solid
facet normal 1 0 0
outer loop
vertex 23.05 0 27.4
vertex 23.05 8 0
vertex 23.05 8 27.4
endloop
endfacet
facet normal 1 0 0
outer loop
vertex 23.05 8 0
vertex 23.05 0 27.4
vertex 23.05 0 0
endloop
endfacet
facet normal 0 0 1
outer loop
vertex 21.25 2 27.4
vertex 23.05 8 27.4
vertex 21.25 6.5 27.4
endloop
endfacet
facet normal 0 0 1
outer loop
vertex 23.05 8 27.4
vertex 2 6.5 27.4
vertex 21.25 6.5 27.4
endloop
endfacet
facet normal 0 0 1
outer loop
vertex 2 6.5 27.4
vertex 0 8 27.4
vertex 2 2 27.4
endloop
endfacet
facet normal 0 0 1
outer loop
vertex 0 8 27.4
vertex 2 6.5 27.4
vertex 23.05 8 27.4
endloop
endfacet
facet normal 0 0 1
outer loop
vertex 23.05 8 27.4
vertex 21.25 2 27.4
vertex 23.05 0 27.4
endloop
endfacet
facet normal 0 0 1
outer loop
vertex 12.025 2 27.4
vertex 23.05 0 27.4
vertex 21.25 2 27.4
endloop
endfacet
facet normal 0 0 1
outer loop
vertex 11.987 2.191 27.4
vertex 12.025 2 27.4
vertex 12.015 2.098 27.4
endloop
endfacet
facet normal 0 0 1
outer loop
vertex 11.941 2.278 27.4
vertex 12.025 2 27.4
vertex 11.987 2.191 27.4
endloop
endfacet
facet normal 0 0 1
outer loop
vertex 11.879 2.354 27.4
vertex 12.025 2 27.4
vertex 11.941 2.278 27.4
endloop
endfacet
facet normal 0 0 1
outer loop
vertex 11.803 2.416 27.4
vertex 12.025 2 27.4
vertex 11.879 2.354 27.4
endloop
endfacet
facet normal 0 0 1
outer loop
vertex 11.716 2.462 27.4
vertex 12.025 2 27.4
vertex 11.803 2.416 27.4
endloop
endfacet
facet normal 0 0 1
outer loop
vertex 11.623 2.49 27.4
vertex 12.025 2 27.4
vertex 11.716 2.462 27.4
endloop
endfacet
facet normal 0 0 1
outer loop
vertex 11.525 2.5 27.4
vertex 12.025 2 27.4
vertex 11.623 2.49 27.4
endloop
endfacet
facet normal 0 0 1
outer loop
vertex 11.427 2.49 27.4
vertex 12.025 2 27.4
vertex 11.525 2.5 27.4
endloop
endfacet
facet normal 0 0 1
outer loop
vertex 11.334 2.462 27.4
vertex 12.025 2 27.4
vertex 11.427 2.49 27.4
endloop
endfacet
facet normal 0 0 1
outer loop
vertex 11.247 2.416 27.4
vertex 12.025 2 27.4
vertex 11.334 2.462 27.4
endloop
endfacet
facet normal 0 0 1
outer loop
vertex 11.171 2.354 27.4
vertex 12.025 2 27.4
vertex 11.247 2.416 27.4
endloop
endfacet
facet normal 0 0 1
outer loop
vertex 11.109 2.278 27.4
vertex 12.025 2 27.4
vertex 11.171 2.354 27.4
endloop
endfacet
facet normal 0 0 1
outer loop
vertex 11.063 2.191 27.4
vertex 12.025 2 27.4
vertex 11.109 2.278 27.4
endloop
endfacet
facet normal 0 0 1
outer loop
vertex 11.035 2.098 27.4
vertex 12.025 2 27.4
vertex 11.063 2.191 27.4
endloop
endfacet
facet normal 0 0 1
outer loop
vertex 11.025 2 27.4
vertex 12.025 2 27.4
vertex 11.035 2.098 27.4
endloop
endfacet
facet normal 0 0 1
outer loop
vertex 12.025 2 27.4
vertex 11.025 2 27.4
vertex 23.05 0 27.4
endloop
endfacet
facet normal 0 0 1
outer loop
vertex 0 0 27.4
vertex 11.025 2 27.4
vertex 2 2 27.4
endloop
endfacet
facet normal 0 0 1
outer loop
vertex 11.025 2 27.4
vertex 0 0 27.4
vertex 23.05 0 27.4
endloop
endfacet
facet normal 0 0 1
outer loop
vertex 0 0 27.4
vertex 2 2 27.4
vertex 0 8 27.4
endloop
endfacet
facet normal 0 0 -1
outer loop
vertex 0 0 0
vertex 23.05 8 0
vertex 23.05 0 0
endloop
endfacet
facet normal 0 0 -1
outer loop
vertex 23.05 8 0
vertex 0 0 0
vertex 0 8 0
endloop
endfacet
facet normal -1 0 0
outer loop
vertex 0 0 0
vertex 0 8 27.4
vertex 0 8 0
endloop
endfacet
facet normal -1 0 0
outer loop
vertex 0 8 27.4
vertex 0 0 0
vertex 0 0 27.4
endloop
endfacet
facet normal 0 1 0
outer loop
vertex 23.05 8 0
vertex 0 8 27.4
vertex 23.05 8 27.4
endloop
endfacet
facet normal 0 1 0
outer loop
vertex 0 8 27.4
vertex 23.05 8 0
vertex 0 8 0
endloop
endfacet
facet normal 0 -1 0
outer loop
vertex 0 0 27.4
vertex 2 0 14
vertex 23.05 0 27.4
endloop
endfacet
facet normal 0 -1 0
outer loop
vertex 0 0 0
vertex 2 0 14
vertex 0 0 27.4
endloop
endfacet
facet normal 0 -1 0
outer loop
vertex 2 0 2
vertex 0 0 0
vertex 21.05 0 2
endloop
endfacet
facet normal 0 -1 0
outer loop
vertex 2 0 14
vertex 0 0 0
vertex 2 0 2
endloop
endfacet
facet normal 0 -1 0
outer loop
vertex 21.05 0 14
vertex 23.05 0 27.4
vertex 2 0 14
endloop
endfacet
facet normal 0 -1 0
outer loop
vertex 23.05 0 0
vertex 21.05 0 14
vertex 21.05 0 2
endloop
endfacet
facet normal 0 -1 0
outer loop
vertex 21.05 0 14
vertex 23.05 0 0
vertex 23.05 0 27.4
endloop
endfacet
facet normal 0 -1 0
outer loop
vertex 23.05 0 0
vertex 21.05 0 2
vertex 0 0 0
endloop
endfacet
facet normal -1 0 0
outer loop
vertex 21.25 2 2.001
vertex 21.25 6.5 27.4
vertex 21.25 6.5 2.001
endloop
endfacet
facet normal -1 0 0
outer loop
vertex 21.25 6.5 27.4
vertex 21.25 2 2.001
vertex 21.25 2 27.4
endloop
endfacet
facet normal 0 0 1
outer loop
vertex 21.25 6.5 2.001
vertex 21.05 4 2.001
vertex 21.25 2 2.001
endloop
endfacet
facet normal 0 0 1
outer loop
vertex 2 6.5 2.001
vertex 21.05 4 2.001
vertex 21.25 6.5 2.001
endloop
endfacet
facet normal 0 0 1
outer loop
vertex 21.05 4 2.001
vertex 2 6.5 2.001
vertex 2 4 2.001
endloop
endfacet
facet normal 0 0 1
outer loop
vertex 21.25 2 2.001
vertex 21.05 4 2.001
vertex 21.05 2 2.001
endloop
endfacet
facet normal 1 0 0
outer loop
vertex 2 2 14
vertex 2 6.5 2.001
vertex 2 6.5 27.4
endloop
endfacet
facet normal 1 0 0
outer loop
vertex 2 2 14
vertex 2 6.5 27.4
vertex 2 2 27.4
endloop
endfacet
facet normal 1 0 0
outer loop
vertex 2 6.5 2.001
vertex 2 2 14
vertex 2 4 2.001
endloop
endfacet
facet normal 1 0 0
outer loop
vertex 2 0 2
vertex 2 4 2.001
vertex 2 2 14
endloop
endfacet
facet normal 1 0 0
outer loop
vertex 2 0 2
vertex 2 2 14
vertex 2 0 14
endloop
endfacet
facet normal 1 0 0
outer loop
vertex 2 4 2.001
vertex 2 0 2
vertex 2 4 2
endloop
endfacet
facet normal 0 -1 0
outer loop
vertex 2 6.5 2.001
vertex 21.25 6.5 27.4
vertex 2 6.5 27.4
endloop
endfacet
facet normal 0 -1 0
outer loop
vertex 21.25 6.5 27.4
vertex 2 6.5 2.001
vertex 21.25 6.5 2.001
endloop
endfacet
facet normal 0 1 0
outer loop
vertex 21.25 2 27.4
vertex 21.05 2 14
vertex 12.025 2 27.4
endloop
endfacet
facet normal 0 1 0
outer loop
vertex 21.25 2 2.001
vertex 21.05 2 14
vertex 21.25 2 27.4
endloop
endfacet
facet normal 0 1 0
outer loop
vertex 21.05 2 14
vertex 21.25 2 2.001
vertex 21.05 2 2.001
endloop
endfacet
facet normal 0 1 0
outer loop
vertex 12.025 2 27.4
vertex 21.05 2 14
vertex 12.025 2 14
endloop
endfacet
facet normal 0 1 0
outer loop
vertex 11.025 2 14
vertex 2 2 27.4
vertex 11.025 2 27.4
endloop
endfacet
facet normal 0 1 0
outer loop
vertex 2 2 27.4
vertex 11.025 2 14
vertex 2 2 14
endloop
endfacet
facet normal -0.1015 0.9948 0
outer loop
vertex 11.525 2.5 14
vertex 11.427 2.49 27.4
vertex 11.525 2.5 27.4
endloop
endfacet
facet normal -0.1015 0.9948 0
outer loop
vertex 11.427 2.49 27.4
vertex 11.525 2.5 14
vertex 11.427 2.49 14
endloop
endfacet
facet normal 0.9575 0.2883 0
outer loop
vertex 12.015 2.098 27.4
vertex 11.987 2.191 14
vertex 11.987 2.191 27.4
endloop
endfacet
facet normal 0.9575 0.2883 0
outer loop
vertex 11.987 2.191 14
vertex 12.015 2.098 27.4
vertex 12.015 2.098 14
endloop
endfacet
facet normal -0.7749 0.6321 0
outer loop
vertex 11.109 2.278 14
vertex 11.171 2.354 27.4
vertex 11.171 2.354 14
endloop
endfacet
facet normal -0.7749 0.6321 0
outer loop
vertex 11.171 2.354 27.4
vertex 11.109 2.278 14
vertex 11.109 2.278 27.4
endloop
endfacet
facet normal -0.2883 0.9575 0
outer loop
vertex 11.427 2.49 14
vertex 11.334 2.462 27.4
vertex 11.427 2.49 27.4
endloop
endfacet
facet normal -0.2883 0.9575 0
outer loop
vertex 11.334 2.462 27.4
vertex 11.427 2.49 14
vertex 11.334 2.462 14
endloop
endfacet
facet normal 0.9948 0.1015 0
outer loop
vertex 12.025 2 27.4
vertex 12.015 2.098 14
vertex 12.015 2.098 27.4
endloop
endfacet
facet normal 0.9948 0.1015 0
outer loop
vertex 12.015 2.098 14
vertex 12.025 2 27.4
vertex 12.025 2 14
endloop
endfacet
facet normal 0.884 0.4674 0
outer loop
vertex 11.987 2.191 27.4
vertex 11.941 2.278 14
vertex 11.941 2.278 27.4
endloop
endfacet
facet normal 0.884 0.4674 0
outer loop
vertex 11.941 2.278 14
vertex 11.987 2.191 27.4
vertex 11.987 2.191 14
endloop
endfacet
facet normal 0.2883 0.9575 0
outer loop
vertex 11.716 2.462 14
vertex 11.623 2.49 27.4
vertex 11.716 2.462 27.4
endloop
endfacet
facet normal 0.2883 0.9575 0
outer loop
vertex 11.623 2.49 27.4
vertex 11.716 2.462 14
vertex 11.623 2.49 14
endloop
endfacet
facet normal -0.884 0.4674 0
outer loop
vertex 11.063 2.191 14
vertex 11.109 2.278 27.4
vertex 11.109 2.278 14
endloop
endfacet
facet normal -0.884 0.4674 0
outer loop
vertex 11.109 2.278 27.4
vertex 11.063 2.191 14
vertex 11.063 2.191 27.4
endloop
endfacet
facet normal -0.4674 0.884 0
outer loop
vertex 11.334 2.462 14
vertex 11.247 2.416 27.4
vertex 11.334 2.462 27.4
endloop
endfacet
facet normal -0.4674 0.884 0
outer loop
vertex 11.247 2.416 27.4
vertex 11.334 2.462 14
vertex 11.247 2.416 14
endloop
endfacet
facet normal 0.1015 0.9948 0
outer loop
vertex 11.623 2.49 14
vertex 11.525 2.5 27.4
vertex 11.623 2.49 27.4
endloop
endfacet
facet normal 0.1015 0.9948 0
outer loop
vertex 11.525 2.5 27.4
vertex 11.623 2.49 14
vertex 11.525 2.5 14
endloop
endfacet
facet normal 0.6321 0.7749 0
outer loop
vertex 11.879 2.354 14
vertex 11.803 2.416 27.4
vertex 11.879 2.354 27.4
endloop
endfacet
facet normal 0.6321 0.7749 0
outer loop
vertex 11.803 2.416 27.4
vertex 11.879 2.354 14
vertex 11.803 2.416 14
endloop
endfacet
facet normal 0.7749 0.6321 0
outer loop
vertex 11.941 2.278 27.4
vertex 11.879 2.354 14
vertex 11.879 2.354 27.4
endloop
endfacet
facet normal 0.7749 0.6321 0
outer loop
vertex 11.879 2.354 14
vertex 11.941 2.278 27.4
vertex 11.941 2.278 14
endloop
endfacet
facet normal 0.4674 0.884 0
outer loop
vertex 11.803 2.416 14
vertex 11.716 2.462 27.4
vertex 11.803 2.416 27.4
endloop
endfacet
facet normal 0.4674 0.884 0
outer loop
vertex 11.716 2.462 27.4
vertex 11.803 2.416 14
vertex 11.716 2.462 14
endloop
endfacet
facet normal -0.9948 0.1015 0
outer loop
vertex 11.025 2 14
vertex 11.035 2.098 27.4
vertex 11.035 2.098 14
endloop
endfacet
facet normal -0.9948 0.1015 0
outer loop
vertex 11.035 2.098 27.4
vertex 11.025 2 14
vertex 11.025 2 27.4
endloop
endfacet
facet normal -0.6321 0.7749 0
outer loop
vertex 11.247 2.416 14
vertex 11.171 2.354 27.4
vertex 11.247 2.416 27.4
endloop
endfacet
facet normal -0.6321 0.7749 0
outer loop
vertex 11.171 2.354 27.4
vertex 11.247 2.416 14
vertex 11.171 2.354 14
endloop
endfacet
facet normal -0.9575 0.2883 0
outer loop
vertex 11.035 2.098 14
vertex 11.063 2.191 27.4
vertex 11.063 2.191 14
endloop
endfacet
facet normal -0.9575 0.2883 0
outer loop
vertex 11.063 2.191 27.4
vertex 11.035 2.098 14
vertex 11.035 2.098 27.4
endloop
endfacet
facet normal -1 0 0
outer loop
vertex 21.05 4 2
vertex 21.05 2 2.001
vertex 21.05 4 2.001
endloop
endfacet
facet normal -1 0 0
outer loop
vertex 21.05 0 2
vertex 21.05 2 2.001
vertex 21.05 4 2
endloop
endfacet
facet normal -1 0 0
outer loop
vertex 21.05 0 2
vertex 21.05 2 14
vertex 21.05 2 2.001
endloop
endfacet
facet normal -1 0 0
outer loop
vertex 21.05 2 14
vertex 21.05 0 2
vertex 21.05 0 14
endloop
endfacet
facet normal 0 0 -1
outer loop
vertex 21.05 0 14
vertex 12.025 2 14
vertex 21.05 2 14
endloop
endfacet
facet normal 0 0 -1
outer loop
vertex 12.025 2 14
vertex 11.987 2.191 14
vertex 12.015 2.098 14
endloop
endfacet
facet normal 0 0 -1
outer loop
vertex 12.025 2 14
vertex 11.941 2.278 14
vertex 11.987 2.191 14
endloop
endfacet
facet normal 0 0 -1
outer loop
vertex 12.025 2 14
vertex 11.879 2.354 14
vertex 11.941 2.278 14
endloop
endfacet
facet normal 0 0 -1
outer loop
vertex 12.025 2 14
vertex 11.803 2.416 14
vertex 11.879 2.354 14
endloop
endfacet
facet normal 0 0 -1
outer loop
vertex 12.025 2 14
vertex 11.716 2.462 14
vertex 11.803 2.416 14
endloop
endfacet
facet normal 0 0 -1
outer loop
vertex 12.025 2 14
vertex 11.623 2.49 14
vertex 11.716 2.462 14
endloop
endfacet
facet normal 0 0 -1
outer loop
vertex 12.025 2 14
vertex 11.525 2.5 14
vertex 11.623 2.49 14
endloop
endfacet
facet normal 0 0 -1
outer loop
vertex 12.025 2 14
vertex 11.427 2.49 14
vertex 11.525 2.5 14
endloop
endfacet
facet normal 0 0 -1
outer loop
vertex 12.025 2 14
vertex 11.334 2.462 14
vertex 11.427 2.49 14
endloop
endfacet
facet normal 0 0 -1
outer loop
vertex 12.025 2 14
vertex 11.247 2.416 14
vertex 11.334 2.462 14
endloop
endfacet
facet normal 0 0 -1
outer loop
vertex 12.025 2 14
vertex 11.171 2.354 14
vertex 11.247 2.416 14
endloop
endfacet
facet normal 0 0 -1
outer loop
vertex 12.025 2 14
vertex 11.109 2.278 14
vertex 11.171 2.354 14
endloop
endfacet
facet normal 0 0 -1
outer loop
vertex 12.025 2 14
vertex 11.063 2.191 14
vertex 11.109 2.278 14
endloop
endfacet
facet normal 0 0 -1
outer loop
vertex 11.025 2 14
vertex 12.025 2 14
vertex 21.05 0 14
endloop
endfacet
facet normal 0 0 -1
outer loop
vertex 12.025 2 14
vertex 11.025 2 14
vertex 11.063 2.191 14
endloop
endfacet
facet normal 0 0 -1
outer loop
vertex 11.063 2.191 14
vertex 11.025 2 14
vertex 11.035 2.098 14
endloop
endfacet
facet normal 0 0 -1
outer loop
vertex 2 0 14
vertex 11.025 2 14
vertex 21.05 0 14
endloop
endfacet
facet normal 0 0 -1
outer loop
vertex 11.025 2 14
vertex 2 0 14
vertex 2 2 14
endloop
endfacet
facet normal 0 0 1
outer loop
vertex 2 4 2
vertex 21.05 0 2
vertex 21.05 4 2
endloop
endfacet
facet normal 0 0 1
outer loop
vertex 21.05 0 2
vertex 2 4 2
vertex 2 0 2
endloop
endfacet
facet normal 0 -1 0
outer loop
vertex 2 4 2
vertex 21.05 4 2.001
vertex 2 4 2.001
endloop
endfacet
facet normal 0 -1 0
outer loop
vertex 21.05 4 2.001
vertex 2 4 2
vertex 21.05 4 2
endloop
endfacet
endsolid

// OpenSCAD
// Chisel Cap
// By: Lloyd Leung
// 2025-July-02

// Creative Commons
// CC BY-SA
// This license enables reusers to distribute, remix, adapt, and build upon the material in any medium or format, so long as attribution is given to the creator. The license allows for commercial use. If you remix, adapt, or build upon the material, you must license the modified material under identical terms. CC BY-SA includes the following elements:

// BY: credit must be given to the creator.
// SA: Adaptations must be shared under the same terms.

// Inspriations from: Gxrkensalat https://www.printables.com/model/797929-tpu-chisel-protection


// units: millimeters
chisel_w = 25.4*.75;
chisel_h = 4; 

wall_thickness = 2;

sheath_depth = 25.4; // how deep the chisel should go into the cap.

cylinderBump = .5; // use to cause a friction fit. Set to ZERO if you don't want it.


nudge_width = 0.2;  // nudge the width of the hole.  Bigger the number, the looser the fit
nudge_height = 0.5; // nudge the thickness of the hole. 0.5. will increase hole by 0.5


// the outter walls of the cap.
outterWall_w = chisel_w + (2*wall_thickness);
outterWall_h = chisel_h + (2*wall_thickness);
outterWall_d = sheath_depth + wall_thickness;


hole_height = 12; // the height at which the hole will be.



difference(){ // hole for dust/chips

    union(){ // cylinder + box together
        difference(){ // Basic hollow box, to slide the chisel in
            cube(size = [outterWall_w, outterWall_h, outterWall_d], center = false);

            translate([wall_thickness,wall_thickness,wall_thickness+.001])    
                cube(size = [chisel_w+nudge_width, chisel_h+nudge_height, sheath_depth], center = false);
           
        }

        // cylinder, for friction fit
        move_cylinder_along_x = wall_thickness + (0.5 * chisel_w);
        translate([move_cylinder_along_x, wall_thickness, wall_thickness+.01])
          cylinder(h= sheath_depth-.01, r = cylinderBump, center=false, $fn= 32)  ;
    } // /union


    // hole/window, for dust/chips
    translate([wall_thickness, 0, wall_thickness])    
        cube(size = [chisel_w, chisel_h, hole_height], center = false);
}
